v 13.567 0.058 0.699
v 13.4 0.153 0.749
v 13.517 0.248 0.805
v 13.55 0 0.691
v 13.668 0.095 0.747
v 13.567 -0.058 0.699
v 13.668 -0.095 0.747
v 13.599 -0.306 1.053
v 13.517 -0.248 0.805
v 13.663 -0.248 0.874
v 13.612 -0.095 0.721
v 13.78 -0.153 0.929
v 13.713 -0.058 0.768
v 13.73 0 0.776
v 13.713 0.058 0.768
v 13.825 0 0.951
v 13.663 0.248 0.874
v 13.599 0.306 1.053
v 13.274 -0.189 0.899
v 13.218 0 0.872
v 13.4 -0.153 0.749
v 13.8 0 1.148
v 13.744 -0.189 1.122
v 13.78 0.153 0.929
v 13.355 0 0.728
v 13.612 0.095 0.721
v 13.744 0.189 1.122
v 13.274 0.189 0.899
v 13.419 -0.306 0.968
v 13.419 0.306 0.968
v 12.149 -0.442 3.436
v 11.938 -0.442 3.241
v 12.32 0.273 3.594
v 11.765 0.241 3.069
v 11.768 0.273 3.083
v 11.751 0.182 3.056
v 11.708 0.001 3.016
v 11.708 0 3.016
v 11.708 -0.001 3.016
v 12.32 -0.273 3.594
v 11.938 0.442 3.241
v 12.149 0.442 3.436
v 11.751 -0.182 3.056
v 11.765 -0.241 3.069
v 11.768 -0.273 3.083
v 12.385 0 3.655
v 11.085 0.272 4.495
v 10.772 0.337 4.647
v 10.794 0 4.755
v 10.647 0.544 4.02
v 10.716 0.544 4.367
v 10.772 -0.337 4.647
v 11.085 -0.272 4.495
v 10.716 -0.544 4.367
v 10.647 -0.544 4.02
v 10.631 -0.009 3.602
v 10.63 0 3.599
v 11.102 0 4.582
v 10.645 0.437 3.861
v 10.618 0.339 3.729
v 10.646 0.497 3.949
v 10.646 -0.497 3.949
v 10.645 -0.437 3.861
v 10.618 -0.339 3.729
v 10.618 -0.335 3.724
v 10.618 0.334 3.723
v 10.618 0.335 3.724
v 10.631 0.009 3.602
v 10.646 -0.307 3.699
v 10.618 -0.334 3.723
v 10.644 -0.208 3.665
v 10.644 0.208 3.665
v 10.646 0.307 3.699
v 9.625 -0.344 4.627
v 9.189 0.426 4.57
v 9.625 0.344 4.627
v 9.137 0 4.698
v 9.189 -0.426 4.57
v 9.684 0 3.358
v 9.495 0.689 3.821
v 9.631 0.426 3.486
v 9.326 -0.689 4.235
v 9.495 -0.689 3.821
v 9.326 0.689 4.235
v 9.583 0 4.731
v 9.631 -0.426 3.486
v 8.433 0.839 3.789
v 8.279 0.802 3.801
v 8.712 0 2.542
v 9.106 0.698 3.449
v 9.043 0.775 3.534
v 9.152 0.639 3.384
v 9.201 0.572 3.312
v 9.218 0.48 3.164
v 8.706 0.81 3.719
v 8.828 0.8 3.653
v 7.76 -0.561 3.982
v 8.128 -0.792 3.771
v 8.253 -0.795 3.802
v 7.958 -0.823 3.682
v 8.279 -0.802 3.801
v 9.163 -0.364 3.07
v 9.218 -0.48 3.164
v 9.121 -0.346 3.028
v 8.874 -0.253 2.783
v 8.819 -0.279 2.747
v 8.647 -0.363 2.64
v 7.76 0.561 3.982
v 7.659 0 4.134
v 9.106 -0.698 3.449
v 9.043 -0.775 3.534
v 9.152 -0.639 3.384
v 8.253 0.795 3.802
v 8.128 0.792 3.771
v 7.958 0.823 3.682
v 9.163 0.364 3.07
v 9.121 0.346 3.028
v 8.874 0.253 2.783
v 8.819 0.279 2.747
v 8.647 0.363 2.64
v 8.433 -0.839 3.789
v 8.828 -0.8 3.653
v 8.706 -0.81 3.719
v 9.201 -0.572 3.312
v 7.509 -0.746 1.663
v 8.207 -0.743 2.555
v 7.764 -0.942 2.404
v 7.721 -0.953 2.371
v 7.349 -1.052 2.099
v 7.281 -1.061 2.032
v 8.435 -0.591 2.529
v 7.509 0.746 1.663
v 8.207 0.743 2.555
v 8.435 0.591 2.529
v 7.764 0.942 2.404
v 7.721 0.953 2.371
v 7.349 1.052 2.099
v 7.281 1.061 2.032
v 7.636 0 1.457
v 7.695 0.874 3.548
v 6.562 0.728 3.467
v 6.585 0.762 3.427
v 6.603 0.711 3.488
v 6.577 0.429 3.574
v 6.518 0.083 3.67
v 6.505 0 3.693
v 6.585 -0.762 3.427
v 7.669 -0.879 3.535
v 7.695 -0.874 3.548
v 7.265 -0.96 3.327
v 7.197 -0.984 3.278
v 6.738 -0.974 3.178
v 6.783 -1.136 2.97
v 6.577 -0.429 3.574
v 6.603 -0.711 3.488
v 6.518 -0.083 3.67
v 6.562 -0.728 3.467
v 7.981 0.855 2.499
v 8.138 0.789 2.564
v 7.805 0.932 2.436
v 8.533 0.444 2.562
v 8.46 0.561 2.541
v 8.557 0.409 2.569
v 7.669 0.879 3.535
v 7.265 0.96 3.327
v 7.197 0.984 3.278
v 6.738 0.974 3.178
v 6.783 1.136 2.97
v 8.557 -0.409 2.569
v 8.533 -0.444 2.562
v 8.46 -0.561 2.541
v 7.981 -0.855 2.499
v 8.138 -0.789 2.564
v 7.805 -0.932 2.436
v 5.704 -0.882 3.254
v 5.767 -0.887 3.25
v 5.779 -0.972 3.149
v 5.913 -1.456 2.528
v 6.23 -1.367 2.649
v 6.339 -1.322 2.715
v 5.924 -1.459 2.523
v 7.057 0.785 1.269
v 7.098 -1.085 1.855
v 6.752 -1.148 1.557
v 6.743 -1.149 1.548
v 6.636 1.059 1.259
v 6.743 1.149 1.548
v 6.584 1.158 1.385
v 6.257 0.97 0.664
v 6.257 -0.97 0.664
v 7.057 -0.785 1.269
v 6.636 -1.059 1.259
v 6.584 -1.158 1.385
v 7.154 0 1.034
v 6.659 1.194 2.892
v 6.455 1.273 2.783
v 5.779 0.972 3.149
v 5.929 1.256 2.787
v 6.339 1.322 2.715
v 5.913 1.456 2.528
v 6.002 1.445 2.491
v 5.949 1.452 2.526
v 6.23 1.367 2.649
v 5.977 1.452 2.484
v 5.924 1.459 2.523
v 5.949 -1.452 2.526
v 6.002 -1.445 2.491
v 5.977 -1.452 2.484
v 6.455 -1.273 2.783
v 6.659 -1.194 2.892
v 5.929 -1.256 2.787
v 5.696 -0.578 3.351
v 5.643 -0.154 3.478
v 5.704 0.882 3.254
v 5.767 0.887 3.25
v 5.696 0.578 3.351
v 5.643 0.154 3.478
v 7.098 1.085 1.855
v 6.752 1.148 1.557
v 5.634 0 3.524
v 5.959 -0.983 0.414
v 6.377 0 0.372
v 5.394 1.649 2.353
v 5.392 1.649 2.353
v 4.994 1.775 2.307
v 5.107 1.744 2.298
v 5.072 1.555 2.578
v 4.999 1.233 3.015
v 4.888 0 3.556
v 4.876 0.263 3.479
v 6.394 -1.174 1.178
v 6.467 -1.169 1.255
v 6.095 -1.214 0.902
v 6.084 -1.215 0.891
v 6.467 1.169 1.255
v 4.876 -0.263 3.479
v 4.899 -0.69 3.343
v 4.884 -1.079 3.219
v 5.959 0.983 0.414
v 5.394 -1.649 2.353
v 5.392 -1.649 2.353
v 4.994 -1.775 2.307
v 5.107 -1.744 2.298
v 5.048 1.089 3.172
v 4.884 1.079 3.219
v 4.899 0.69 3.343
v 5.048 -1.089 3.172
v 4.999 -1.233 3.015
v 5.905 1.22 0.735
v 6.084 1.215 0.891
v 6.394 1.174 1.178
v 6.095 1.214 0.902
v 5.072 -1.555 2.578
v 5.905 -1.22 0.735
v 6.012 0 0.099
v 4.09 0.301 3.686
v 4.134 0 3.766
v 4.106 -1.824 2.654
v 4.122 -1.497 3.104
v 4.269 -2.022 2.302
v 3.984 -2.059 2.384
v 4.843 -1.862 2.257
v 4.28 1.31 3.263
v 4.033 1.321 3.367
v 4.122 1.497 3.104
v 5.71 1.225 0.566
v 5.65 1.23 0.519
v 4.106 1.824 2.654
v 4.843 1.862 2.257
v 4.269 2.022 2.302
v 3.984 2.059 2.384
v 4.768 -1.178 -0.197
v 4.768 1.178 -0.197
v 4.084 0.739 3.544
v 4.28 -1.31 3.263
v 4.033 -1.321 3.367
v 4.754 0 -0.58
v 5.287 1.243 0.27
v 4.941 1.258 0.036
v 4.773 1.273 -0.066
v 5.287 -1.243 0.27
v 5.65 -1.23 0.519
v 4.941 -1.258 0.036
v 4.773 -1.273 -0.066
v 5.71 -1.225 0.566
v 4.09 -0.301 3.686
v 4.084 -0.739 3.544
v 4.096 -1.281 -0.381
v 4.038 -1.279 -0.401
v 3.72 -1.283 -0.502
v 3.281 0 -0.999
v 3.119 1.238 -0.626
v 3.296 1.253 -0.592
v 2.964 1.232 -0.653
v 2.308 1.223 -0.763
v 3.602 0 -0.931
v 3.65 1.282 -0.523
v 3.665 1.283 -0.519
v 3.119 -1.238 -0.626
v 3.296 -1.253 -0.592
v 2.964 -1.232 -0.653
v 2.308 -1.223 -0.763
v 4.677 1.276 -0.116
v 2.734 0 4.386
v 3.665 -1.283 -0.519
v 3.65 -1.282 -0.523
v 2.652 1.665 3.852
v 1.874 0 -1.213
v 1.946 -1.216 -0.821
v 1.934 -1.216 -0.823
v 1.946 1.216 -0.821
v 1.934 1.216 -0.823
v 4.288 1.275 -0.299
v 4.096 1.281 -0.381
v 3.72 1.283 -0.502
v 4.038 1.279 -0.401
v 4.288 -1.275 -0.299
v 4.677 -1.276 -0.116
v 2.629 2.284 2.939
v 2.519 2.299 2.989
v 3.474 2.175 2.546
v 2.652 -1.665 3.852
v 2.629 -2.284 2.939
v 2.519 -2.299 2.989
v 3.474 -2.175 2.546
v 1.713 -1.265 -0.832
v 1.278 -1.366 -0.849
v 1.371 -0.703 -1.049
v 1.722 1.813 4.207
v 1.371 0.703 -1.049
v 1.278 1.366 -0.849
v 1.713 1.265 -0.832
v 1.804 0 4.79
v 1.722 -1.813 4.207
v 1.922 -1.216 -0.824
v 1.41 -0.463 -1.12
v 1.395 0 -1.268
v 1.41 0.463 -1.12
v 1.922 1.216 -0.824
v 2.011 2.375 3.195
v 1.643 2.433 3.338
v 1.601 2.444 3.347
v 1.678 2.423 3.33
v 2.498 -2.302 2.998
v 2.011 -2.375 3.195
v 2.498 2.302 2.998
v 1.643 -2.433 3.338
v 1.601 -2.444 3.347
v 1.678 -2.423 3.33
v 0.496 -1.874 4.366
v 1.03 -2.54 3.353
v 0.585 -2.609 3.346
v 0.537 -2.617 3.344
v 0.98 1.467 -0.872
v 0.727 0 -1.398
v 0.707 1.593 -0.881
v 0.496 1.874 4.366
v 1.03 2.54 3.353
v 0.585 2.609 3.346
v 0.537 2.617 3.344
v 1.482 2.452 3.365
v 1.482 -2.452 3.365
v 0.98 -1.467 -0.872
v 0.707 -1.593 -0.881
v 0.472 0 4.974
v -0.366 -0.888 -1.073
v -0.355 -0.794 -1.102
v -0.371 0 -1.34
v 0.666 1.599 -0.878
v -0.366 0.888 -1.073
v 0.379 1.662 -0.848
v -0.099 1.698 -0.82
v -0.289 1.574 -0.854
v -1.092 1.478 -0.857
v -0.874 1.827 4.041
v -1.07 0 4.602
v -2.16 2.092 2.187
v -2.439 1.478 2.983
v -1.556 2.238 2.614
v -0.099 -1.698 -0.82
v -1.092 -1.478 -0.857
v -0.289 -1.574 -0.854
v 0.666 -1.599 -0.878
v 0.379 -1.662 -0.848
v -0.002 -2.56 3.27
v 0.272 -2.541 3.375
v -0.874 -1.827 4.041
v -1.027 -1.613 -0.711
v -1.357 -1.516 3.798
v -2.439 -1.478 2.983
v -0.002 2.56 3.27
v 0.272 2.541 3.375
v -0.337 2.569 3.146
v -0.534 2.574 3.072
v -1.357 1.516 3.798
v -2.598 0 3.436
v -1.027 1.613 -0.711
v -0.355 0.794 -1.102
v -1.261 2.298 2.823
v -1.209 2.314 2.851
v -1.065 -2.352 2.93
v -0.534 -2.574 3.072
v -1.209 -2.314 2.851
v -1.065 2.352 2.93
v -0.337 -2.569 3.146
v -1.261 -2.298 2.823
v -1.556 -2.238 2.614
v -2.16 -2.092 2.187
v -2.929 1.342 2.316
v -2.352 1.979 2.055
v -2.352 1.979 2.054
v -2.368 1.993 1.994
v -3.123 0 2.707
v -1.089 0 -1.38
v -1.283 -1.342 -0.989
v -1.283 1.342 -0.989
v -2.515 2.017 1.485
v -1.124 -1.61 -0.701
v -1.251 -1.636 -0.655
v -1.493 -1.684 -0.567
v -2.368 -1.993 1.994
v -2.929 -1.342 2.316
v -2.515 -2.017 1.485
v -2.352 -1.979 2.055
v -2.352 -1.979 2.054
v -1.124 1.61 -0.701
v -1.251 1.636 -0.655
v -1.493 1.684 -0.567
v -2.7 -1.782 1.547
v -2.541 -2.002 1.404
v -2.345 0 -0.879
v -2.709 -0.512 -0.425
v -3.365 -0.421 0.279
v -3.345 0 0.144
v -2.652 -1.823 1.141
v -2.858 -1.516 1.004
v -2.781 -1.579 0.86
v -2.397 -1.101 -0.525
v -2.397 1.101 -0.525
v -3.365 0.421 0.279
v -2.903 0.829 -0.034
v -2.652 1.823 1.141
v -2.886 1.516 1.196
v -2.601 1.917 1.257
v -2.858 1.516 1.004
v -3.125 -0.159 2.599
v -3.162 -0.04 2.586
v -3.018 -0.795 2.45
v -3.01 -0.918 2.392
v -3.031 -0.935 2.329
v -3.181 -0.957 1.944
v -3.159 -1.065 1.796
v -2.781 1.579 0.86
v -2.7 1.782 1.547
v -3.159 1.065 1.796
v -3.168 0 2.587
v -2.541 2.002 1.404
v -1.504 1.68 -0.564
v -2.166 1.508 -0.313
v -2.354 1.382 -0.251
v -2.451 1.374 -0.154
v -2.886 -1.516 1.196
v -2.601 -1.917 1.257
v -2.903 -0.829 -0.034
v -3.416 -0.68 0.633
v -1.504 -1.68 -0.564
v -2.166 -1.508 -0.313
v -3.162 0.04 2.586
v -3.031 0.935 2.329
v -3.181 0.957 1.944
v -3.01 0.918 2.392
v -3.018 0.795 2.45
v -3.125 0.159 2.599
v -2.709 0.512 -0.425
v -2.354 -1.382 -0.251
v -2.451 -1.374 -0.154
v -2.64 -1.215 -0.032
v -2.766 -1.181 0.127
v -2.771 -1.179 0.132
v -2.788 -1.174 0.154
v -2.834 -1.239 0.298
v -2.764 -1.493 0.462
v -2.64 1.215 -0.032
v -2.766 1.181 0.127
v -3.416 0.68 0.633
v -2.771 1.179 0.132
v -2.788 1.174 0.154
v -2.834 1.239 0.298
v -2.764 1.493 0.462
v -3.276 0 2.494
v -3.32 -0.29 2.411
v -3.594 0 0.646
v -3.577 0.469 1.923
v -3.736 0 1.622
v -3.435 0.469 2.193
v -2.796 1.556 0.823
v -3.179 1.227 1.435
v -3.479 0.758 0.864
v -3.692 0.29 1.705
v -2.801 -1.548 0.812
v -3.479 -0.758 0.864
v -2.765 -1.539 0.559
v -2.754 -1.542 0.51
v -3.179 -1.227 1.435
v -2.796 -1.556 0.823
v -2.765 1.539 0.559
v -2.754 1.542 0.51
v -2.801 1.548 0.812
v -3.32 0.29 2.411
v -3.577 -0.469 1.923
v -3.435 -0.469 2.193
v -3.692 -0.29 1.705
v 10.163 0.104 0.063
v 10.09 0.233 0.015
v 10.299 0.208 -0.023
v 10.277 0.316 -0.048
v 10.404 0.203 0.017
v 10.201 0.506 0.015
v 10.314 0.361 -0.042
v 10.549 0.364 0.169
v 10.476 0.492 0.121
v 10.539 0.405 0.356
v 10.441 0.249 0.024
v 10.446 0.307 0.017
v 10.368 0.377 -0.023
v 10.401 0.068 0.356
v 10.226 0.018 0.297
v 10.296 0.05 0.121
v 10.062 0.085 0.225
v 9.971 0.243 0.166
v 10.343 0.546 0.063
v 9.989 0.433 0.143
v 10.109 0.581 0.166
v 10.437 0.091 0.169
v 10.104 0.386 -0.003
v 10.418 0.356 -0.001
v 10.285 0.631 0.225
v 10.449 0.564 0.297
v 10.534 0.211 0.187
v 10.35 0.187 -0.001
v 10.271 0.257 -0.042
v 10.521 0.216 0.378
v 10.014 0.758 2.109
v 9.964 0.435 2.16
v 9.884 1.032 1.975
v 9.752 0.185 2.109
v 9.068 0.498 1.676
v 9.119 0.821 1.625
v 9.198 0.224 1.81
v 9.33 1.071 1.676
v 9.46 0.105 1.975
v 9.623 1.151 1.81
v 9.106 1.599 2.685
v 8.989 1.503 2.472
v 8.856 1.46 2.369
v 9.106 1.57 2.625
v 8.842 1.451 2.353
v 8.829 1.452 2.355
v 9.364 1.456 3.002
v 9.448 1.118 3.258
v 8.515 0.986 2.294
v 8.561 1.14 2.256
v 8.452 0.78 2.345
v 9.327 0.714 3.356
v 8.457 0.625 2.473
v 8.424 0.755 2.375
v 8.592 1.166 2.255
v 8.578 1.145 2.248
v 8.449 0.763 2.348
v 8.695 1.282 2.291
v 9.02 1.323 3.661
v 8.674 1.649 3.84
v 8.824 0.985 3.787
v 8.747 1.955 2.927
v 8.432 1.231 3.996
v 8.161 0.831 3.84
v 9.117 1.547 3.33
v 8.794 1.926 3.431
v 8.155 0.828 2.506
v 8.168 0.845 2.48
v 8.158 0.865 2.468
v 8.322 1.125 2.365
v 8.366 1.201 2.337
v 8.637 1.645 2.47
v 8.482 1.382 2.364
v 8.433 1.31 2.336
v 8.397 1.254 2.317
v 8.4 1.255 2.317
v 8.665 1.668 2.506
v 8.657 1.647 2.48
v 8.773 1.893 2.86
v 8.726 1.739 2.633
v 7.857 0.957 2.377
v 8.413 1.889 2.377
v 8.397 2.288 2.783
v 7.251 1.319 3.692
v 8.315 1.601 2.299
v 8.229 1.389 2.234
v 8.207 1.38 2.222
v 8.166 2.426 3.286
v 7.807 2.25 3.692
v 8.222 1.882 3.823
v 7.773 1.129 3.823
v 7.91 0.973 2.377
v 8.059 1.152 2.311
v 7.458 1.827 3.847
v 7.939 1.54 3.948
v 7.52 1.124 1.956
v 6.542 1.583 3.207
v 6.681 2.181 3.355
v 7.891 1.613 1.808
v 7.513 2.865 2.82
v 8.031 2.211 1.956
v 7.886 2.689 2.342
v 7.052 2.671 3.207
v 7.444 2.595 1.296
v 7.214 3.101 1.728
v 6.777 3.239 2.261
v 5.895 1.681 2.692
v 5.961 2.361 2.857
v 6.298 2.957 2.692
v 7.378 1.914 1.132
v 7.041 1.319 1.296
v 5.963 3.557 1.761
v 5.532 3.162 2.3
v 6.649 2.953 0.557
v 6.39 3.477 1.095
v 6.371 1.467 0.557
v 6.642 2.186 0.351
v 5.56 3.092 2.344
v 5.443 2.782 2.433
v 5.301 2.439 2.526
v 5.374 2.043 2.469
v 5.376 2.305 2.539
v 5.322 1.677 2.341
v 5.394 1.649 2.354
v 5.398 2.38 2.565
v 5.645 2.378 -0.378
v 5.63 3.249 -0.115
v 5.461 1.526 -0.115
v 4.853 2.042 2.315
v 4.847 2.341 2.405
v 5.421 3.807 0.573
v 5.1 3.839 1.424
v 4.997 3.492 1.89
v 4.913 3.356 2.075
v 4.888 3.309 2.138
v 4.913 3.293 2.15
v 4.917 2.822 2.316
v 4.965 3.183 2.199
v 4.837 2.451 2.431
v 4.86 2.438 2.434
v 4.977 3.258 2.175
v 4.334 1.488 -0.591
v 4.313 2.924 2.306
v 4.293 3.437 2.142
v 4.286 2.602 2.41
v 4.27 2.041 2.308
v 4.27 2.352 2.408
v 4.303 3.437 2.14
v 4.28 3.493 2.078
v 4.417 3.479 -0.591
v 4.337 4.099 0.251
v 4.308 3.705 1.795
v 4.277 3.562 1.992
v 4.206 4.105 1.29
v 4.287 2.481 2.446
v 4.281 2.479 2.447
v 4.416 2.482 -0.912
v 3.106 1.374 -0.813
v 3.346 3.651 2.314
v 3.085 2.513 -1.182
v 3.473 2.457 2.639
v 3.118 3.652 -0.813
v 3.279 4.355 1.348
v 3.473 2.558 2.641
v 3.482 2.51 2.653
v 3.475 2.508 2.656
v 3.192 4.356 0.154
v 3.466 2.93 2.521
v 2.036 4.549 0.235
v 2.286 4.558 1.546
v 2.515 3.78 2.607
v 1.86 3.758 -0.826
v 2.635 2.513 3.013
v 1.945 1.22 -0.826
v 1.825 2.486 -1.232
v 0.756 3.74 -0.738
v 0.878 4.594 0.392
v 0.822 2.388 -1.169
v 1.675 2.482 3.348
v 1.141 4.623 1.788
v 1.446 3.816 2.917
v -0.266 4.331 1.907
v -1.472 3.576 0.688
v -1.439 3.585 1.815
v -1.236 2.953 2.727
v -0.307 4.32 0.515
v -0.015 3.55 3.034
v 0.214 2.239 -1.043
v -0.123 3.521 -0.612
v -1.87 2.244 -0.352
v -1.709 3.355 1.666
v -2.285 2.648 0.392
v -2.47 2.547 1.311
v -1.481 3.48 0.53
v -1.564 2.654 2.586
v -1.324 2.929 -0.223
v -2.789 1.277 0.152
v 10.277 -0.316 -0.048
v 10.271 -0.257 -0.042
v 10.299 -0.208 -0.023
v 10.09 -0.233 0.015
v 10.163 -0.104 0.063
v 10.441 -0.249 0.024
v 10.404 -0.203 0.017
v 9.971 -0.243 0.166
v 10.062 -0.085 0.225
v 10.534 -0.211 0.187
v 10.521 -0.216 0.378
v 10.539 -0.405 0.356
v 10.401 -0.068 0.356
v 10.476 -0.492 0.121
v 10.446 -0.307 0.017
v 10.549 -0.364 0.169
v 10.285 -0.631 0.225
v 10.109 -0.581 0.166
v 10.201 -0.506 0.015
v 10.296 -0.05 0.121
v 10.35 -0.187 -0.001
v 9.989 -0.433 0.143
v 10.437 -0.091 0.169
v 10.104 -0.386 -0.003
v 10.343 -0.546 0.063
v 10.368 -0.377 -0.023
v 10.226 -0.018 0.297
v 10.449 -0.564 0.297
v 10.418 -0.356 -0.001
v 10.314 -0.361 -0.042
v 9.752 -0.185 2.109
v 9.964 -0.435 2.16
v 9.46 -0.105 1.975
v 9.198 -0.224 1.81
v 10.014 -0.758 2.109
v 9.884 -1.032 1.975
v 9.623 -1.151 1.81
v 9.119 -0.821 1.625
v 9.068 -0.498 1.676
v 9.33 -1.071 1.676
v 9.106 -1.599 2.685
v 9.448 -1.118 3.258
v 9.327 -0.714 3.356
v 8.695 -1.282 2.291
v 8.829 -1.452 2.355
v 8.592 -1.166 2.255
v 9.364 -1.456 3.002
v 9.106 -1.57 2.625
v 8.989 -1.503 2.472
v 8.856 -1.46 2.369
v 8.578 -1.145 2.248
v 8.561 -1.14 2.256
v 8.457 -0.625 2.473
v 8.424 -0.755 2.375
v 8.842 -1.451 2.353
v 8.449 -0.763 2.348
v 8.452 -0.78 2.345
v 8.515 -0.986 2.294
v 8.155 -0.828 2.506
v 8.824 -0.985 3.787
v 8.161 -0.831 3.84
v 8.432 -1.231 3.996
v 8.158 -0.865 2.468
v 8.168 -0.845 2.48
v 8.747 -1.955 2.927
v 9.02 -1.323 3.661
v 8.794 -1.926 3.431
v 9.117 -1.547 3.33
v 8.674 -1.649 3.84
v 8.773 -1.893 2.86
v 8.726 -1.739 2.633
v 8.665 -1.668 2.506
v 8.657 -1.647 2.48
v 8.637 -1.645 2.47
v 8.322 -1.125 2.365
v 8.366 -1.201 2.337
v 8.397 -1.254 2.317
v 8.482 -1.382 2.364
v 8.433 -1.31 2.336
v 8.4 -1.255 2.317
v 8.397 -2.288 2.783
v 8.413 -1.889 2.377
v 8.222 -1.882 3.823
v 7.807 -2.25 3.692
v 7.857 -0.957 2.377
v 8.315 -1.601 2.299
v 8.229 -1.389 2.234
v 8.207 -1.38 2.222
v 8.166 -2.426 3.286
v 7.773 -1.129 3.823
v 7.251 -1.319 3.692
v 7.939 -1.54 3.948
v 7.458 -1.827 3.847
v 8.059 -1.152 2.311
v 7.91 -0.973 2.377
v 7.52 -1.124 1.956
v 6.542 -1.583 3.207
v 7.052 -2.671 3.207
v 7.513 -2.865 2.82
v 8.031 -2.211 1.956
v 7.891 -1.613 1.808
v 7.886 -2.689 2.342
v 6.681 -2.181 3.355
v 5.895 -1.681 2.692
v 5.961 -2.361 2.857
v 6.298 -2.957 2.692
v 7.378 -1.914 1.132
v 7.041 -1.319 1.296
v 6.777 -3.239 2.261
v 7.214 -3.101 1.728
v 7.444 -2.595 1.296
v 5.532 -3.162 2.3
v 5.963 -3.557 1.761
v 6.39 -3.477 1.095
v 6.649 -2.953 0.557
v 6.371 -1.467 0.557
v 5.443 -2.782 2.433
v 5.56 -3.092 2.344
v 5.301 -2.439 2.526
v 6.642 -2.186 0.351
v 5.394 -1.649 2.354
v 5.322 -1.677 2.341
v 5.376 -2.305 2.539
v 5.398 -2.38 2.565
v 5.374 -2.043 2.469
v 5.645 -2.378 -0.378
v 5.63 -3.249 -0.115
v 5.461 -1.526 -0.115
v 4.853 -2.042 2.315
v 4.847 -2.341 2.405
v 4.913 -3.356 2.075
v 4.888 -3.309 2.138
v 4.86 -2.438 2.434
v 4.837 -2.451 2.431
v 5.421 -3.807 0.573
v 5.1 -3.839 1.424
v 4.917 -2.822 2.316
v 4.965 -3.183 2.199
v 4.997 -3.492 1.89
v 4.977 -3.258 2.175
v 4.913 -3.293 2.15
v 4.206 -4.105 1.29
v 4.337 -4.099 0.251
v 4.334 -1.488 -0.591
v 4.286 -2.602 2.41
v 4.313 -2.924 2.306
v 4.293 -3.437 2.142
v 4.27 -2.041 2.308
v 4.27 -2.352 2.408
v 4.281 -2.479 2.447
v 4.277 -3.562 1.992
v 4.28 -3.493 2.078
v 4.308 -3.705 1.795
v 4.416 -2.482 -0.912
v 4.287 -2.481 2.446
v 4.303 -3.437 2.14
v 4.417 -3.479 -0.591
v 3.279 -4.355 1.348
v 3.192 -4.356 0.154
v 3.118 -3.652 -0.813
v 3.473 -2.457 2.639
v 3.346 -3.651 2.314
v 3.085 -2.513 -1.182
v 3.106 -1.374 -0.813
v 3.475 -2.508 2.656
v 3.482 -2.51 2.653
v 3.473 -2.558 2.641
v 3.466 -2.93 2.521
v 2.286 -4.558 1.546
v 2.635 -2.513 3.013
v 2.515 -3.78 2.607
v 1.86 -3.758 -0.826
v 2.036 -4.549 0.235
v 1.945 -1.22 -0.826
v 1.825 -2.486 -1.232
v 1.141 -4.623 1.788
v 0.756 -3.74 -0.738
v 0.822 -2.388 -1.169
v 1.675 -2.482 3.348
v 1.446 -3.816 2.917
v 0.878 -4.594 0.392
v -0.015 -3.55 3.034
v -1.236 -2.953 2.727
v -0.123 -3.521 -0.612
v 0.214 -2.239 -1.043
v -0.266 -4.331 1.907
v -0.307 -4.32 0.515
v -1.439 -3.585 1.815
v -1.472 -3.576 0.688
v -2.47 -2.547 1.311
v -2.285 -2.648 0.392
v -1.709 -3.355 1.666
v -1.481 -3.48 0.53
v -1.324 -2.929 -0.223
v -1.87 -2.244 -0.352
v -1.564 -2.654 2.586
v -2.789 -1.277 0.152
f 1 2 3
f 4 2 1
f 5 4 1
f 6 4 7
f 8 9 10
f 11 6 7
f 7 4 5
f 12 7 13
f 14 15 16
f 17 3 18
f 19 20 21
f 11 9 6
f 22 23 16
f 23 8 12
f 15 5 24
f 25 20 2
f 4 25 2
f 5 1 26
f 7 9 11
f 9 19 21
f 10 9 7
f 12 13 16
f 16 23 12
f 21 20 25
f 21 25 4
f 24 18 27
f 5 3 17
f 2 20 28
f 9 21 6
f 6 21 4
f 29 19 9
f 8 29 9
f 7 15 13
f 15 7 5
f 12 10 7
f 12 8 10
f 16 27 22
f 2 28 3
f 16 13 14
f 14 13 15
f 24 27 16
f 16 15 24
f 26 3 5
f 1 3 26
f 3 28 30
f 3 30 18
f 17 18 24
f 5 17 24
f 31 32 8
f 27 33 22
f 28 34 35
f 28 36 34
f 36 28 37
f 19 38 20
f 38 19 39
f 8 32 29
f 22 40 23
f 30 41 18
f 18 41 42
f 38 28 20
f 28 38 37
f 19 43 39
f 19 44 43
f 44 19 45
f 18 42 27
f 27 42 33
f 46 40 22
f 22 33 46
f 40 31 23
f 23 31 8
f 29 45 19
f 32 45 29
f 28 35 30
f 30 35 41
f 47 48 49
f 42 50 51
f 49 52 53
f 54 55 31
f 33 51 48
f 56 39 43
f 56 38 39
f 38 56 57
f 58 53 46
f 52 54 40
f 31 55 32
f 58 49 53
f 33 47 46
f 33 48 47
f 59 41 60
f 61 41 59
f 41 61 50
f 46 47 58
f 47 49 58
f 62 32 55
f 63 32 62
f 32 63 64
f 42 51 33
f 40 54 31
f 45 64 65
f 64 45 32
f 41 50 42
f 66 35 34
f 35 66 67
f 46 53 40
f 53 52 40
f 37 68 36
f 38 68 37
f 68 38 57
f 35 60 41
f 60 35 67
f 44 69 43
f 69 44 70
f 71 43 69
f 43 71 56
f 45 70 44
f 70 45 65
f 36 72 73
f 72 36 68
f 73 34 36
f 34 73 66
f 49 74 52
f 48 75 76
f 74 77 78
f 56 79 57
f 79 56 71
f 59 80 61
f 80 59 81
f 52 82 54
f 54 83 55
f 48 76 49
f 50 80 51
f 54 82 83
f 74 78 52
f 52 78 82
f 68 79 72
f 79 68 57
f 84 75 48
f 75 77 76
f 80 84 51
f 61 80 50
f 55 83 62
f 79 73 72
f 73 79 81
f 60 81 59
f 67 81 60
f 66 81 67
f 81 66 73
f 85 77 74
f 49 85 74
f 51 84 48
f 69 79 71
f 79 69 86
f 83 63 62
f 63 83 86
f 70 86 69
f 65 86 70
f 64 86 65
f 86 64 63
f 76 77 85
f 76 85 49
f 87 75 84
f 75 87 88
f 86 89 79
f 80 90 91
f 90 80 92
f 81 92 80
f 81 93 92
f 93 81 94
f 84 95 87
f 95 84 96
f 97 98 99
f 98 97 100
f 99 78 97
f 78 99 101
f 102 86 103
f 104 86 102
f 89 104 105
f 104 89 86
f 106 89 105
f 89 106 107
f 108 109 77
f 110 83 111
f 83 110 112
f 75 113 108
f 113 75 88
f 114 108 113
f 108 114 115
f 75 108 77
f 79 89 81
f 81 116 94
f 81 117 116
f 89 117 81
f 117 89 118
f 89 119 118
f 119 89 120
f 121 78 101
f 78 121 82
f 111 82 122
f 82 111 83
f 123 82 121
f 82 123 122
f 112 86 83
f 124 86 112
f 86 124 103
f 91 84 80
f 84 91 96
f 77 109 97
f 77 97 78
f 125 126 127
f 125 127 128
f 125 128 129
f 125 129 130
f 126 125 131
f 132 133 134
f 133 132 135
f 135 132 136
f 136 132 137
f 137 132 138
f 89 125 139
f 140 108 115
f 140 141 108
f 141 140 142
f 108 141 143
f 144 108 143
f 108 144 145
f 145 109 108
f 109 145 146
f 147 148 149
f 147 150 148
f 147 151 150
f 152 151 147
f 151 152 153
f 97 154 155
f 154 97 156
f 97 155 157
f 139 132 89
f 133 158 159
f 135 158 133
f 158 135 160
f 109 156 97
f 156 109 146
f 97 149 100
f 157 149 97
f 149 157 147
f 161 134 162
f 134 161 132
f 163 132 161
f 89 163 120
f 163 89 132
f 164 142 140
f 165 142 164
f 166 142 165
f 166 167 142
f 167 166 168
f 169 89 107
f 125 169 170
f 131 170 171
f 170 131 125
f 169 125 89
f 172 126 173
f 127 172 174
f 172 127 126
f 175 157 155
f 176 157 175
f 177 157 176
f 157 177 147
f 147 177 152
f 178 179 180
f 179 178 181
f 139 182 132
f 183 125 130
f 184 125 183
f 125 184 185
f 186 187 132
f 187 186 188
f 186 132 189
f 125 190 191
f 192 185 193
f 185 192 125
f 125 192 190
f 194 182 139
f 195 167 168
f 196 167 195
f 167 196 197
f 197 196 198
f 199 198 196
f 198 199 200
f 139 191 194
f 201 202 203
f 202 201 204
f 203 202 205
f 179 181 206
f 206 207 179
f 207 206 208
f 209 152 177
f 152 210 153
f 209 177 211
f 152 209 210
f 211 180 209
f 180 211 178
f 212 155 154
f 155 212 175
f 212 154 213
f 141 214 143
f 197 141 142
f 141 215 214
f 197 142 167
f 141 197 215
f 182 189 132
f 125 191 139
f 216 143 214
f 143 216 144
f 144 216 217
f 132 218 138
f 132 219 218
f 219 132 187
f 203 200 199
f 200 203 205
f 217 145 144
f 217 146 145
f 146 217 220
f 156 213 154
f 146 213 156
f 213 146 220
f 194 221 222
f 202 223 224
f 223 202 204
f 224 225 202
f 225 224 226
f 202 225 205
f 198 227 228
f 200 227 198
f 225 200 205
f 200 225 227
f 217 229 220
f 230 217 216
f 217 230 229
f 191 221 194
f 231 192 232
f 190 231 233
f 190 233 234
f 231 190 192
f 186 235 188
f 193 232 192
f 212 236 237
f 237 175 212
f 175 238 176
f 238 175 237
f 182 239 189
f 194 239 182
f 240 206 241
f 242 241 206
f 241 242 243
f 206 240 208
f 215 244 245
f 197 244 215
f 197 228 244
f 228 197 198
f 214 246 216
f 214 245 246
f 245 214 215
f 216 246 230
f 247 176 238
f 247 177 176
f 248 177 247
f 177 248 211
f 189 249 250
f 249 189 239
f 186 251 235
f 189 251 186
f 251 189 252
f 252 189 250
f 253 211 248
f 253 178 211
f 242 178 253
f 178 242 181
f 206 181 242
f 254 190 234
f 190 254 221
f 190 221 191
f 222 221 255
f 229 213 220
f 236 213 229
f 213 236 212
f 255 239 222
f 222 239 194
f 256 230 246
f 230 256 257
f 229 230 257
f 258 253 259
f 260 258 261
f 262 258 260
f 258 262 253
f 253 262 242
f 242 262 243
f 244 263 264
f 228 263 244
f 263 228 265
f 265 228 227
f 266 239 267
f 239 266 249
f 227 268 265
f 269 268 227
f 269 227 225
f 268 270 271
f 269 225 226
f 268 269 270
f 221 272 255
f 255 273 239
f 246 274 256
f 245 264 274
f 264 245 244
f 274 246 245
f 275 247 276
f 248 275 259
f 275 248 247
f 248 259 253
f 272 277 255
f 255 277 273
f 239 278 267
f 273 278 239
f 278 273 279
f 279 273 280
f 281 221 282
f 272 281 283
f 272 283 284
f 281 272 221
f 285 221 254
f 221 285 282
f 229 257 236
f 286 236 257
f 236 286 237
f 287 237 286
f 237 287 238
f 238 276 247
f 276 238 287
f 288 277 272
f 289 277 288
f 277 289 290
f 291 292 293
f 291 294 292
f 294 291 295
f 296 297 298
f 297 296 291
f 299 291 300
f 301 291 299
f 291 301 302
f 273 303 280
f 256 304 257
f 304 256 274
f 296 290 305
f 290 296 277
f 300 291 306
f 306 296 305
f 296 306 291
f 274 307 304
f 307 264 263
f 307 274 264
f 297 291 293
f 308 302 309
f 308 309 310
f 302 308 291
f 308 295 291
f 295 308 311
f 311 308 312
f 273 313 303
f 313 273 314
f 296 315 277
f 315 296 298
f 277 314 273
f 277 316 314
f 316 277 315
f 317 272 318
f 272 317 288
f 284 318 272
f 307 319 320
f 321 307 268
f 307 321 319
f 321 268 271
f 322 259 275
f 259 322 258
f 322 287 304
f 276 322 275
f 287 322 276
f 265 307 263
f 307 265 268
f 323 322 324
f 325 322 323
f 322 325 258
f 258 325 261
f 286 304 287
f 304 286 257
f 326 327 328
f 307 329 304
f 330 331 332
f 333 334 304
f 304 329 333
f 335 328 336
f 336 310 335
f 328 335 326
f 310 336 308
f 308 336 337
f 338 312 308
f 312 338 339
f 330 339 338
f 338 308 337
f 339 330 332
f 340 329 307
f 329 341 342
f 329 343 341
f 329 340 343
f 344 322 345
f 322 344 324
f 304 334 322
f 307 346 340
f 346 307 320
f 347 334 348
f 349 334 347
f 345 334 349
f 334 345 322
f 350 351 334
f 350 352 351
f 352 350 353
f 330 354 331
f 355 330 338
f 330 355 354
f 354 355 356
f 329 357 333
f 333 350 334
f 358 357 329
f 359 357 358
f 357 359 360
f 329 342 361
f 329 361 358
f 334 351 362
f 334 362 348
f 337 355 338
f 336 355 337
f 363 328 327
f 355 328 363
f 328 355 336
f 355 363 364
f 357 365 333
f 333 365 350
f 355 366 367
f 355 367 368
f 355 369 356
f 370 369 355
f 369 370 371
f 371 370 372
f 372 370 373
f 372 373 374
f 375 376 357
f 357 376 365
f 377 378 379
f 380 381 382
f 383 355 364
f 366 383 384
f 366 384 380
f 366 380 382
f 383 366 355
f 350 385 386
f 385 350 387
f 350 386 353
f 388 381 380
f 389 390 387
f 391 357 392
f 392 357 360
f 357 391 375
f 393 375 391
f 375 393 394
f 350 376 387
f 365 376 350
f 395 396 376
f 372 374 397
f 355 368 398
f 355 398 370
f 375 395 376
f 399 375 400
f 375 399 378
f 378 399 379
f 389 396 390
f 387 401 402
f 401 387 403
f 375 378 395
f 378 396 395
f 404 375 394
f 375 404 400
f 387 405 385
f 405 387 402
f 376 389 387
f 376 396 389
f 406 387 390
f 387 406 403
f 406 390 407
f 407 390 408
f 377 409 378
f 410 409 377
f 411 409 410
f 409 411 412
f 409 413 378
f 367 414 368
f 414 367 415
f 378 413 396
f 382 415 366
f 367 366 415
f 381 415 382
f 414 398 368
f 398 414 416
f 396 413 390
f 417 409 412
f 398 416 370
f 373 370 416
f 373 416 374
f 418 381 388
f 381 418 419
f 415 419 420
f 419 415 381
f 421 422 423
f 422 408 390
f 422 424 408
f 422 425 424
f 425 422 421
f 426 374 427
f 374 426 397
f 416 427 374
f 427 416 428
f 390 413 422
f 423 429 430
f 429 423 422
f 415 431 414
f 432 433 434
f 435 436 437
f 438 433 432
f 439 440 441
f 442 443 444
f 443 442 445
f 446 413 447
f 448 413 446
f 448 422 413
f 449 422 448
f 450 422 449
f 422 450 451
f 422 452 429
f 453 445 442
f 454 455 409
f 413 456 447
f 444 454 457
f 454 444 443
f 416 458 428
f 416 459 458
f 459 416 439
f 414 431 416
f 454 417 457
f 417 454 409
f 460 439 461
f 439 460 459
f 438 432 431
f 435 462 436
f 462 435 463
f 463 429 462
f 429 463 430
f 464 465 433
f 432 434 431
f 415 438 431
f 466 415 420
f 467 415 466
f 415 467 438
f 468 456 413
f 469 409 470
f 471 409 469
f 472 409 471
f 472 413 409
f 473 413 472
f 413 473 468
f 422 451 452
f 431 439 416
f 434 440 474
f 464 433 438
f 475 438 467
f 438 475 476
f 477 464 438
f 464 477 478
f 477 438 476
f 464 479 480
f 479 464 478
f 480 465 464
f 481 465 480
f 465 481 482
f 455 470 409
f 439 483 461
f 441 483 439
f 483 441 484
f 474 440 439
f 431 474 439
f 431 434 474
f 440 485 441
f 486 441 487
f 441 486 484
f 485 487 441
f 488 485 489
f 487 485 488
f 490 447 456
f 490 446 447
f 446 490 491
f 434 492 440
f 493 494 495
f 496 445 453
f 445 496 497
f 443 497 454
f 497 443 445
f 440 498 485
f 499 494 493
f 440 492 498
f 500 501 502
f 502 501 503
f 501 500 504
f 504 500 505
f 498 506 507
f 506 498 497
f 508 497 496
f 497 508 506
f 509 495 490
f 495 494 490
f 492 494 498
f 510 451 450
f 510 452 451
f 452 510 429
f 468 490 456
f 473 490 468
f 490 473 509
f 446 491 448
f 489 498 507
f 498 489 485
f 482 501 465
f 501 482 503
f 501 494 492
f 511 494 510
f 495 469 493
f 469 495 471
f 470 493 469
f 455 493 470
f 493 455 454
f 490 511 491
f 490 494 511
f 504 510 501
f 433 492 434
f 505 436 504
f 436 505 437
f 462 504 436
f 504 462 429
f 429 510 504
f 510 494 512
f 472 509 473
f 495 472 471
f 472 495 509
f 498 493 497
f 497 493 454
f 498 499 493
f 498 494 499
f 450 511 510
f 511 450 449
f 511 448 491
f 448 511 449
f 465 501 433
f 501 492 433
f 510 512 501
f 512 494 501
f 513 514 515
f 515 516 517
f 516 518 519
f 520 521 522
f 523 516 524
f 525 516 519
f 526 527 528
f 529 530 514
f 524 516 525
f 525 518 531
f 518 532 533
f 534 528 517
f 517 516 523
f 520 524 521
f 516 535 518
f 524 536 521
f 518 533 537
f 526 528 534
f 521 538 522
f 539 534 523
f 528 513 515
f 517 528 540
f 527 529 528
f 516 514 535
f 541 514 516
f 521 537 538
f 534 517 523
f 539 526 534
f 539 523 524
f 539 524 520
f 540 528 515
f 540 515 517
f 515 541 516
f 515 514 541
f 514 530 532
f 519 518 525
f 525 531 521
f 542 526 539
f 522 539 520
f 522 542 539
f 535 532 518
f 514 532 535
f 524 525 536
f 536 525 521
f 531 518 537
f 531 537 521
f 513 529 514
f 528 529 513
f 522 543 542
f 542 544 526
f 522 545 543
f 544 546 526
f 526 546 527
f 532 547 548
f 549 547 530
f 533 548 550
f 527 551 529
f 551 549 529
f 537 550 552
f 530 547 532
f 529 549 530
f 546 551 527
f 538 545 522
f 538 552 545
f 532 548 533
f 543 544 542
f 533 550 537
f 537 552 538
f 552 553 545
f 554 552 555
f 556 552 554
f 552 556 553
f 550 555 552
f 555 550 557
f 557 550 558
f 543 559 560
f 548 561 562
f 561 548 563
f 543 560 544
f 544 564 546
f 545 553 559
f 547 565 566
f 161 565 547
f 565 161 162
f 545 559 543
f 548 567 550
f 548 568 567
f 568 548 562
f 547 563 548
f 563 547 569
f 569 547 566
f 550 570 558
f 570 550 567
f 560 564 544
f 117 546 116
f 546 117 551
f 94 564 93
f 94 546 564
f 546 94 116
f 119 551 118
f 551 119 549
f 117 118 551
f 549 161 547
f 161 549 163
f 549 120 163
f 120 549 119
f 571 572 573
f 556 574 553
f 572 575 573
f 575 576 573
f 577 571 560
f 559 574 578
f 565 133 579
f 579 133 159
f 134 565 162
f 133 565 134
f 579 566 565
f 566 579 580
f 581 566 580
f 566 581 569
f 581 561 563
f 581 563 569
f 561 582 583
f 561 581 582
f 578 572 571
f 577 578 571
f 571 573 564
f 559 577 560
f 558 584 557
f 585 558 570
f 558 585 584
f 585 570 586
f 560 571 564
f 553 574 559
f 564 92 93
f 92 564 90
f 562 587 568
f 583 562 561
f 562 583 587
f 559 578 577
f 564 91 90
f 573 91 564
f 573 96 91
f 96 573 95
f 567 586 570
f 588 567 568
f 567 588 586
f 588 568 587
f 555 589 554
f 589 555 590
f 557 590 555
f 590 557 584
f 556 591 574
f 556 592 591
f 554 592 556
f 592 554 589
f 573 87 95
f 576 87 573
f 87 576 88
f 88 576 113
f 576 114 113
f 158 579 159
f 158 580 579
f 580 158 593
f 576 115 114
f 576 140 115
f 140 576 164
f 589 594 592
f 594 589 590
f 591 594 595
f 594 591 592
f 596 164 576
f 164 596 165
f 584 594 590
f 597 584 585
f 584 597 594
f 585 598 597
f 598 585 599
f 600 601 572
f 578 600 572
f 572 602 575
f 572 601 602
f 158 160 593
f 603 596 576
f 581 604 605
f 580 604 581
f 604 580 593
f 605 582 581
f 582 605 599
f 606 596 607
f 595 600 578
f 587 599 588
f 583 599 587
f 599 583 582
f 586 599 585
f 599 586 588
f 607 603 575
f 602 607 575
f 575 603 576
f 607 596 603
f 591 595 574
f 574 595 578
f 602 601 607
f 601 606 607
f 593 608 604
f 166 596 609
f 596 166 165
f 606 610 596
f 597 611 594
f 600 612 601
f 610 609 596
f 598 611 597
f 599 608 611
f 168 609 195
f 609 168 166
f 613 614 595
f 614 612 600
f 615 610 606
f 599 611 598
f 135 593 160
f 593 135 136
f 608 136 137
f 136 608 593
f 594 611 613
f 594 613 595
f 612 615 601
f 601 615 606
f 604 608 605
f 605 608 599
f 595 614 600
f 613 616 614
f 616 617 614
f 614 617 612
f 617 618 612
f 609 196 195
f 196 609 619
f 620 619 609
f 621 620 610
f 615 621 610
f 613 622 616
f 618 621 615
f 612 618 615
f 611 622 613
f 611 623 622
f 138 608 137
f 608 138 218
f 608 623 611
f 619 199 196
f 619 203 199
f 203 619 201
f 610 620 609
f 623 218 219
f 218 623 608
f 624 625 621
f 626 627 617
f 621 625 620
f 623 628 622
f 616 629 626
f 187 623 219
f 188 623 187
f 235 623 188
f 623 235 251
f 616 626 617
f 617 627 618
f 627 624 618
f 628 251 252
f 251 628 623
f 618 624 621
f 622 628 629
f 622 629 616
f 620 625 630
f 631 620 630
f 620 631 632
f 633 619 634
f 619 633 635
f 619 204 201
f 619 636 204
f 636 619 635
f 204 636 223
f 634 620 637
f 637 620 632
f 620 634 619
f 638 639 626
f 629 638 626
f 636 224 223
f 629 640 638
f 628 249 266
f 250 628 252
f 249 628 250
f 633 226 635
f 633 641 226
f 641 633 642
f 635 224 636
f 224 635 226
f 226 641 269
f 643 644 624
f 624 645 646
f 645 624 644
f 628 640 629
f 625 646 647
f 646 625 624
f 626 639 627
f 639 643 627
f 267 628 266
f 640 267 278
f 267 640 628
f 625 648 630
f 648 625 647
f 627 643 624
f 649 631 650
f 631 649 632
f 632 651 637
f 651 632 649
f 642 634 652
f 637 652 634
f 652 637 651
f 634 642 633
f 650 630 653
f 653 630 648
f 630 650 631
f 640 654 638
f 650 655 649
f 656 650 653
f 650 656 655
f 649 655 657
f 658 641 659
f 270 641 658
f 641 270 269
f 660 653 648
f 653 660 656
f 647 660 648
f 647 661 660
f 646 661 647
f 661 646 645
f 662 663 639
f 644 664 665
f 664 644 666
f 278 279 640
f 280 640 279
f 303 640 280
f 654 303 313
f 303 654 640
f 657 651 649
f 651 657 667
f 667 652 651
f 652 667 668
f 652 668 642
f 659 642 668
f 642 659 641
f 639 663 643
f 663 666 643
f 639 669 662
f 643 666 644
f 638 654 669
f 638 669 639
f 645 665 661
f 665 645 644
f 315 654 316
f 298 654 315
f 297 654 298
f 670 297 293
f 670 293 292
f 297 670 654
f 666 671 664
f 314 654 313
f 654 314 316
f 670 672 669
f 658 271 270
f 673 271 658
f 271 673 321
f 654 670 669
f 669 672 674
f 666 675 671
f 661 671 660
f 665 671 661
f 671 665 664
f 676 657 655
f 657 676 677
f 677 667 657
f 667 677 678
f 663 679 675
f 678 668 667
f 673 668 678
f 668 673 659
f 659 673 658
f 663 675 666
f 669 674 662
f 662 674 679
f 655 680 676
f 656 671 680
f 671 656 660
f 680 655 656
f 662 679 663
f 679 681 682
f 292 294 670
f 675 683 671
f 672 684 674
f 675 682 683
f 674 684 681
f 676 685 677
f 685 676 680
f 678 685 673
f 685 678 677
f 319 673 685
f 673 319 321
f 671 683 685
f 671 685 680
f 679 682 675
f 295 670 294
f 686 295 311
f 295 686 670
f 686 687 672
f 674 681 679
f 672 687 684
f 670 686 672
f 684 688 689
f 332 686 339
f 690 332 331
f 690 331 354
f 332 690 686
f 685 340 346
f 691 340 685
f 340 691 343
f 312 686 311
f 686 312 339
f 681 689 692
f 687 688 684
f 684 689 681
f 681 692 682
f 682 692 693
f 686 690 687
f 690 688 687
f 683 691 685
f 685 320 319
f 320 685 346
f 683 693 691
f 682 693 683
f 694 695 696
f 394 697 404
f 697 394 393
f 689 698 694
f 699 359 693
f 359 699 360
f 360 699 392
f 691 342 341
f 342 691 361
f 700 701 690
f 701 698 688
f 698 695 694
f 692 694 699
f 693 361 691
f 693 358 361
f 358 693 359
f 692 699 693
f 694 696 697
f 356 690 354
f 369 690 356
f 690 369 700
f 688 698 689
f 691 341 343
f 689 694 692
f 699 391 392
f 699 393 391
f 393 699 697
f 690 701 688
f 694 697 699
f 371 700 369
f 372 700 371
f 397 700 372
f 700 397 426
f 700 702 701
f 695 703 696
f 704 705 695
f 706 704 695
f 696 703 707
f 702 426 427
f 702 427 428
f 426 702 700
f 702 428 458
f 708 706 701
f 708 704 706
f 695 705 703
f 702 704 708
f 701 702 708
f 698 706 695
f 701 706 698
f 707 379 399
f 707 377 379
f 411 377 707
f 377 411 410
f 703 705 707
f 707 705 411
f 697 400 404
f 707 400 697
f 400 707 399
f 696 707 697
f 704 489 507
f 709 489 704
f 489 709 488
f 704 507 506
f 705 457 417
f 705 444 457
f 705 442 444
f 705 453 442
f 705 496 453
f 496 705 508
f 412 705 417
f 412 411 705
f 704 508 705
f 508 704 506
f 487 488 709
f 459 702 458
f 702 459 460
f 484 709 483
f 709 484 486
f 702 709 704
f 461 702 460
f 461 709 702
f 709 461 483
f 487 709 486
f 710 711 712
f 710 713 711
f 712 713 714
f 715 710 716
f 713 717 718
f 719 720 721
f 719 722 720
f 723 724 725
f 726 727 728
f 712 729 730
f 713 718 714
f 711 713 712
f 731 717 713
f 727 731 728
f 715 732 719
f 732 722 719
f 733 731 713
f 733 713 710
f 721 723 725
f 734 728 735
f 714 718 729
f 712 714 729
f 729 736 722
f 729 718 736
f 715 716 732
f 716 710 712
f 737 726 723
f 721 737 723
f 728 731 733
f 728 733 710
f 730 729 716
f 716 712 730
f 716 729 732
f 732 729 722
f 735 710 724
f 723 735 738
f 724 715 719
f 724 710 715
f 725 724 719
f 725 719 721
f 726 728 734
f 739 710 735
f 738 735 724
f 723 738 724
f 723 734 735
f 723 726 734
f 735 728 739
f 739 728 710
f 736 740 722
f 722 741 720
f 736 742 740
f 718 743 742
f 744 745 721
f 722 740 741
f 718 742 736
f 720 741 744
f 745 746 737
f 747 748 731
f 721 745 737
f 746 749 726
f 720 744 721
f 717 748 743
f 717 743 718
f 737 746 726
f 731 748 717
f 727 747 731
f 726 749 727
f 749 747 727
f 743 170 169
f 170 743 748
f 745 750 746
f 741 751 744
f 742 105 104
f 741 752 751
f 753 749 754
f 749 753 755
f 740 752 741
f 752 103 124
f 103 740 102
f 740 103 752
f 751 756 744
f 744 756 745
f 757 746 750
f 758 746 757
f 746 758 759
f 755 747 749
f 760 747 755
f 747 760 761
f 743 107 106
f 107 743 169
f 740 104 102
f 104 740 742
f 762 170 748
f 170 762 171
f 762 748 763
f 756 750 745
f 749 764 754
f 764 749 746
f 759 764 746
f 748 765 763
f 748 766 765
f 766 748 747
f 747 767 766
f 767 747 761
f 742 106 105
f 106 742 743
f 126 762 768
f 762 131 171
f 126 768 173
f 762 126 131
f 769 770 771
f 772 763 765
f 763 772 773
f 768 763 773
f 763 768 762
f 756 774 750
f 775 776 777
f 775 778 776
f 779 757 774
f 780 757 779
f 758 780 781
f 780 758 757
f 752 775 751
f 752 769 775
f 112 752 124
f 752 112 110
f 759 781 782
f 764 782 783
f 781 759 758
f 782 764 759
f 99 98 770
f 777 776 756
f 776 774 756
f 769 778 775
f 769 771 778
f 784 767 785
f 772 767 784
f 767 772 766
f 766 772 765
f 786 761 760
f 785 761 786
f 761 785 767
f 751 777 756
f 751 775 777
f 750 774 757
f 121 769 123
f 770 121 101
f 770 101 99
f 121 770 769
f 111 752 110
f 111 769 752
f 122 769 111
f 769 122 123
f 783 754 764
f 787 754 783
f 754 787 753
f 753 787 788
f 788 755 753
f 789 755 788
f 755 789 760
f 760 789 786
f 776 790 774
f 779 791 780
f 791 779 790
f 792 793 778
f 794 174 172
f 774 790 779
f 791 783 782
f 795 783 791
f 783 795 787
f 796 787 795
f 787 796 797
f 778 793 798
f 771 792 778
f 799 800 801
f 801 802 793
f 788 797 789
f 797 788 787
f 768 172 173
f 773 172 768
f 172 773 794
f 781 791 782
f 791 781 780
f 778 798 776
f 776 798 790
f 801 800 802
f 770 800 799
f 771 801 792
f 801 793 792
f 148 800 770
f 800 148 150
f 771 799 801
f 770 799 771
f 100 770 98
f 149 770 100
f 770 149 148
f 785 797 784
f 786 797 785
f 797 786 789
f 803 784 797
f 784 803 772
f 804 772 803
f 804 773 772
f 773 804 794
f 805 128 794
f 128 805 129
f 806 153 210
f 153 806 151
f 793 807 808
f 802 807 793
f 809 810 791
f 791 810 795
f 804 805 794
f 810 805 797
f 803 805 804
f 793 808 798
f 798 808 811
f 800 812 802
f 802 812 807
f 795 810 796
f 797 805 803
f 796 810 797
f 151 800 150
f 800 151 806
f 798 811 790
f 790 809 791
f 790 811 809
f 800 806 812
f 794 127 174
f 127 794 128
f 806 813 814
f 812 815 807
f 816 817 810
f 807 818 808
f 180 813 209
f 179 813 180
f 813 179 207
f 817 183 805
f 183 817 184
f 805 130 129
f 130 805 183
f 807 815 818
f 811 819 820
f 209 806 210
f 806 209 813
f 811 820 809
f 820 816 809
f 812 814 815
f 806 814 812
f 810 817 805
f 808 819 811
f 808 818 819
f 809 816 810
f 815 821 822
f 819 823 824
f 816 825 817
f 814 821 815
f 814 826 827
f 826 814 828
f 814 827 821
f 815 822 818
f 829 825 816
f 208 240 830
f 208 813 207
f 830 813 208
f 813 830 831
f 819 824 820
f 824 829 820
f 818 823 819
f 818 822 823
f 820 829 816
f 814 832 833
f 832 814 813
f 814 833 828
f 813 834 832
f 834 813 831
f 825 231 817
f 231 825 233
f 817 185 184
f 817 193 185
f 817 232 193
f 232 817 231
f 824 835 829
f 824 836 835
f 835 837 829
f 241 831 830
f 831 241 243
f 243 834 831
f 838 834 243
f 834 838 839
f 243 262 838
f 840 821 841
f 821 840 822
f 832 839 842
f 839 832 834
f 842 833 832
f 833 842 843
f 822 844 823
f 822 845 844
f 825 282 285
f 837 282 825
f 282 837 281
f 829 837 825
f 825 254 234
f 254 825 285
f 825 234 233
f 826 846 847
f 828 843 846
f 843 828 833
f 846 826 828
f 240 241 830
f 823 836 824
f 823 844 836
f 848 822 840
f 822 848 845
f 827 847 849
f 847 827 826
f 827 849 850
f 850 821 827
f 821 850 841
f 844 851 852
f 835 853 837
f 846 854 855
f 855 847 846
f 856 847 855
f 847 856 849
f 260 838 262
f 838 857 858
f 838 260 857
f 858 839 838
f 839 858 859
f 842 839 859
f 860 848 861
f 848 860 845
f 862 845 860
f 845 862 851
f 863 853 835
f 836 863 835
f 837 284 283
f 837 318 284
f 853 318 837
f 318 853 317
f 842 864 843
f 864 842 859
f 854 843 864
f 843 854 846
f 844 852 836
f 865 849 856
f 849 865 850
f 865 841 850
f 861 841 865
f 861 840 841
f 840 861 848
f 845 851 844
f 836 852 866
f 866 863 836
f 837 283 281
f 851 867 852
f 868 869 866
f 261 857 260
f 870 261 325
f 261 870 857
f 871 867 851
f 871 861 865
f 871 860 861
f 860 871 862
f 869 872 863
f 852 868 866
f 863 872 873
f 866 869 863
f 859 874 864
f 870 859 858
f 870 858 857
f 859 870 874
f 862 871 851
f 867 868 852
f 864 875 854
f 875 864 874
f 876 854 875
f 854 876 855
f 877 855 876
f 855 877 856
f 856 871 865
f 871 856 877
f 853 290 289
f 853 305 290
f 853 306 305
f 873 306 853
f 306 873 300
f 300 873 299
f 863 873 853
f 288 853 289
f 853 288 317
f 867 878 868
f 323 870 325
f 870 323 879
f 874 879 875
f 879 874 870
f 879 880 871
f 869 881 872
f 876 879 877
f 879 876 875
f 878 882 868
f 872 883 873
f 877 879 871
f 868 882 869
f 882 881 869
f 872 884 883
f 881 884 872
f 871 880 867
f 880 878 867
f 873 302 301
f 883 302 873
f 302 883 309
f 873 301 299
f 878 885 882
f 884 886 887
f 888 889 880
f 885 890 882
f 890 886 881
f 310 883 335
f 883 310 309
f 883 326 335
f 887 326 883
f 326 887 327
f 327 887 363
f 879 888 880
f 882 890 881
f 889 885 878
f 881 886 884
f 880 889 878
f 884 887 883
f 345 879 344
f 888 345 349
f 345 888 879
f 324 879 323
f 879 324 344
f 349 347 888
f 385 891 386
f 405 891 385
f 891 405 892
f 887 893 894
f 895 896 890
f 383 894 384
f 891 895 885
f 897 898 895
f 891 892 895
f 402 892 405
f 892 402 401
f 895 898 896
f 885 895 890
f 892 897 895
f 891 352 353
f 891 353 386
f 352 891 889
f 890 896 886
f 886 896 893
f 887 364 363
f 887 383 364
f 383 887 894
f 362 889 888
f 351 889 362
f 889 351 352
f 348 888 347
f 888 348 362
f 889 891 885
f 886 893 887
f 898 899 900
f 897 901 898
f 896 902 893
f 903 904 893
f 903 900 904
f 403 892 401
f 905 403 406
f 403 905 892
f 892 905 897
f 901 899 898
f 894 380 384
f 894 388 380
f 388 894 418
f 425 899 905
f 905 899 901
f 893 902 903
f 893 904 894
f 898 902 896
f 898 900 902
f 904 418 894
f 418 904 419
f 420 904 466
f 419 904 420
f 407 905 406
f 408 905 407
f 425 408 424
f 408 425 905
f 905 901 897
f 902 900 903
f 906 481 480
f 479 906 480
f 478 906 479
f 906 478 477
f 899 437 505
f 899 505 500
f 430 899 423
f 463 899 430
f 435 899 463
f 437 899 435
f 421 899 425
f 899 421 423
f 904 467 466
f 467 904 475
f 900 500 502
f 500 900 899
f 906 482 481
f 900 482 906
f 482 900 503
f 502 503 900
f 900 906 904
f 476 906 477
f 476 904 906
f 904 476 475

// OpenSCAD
fn=10;
v=[[-3,0,2,1],[0,0,-1,3],[0,0,4,4],[0,0,3,4],[4,0,0,2],[8,0,-4,1],[8,0,10,0],[12,0,7,1],[15,0,-3,0]];
v2=[[-3,0,0,0],[2,5,3,5],[0,0,1,1],[10,5,-5,1],[6,1,8,1],[9,1,5,1],[11,0,-2,0]];
v3=[[-3,0,0,0],[2,-5,3,5],[0,0,1,1],[10,-5,-5,1],[6,-1,8,1],[9,-1,5,1],[11,0,-2,0]];

bline(v,0.06);
bline(v2,0.06);
bline(v3,0.06);

 // Bline module
module bline(v,detail) {
     translate([bez2(0  , v)[0],bez2(0  , v)[1],bez2(0  , v)[2]])rotate(bez2euler (0,v))           //yourmodule(0,v)
    ;
    for(i = [detail: detail: 1]) {
      
        translate([bez2(i  , v)[0],bez2(i  , v)[1],bez2(i  , v)[2]])rotate(bez2euler (i,v))           //yourmodule(i,v)
        ;
           
        
      hull() {
        translate(t(bez2(i, v))) rotate(bez2euler(i, v)) rotate([0, 90, 0]) {
          sphere(r = bez2(i, v)[3], $fn = fn);
        };
        translate(t(bez2(i - detail, v))) rotate(bez2euler(i - detail, v)) rotate([0, 90, 0]) sphere(r = bez2(i - detail, v)[3], $fn = fn);
      }
    }
  }
  //The recusive
function bez2(t, v) = (len(v) > 2) ? bez2(t, [
  for(i = [0: len(v) - 2]) v[i] * t + v[i + 1] * (1 - t)
]): v[0] * t + v[1] * (1 - t);

//
function lim31(l, v) = v / len3(v) * l;

function len3(v) = sqrt(pow(v[0], 2) + pow(v[1], 2) + pow(v[2], 2));
//unit normal to euler angles
function bez2euler(i, v) = [0, -asin(bez2v(i, v)[2]), atan2(bez2xy(bez2v(i, v))[1], bez2xy(bez2v(i, v))[0])];

function bez2xy(v) = lim31(1, [v[0], v[1], 0]); // down xy projection
function bez2v(i, v) = lim31(1, bez2(i - 0.0001, v) - bez2(i, v)); // unit vector at i
function t(v) = [v[0], v[1], v[2]];
